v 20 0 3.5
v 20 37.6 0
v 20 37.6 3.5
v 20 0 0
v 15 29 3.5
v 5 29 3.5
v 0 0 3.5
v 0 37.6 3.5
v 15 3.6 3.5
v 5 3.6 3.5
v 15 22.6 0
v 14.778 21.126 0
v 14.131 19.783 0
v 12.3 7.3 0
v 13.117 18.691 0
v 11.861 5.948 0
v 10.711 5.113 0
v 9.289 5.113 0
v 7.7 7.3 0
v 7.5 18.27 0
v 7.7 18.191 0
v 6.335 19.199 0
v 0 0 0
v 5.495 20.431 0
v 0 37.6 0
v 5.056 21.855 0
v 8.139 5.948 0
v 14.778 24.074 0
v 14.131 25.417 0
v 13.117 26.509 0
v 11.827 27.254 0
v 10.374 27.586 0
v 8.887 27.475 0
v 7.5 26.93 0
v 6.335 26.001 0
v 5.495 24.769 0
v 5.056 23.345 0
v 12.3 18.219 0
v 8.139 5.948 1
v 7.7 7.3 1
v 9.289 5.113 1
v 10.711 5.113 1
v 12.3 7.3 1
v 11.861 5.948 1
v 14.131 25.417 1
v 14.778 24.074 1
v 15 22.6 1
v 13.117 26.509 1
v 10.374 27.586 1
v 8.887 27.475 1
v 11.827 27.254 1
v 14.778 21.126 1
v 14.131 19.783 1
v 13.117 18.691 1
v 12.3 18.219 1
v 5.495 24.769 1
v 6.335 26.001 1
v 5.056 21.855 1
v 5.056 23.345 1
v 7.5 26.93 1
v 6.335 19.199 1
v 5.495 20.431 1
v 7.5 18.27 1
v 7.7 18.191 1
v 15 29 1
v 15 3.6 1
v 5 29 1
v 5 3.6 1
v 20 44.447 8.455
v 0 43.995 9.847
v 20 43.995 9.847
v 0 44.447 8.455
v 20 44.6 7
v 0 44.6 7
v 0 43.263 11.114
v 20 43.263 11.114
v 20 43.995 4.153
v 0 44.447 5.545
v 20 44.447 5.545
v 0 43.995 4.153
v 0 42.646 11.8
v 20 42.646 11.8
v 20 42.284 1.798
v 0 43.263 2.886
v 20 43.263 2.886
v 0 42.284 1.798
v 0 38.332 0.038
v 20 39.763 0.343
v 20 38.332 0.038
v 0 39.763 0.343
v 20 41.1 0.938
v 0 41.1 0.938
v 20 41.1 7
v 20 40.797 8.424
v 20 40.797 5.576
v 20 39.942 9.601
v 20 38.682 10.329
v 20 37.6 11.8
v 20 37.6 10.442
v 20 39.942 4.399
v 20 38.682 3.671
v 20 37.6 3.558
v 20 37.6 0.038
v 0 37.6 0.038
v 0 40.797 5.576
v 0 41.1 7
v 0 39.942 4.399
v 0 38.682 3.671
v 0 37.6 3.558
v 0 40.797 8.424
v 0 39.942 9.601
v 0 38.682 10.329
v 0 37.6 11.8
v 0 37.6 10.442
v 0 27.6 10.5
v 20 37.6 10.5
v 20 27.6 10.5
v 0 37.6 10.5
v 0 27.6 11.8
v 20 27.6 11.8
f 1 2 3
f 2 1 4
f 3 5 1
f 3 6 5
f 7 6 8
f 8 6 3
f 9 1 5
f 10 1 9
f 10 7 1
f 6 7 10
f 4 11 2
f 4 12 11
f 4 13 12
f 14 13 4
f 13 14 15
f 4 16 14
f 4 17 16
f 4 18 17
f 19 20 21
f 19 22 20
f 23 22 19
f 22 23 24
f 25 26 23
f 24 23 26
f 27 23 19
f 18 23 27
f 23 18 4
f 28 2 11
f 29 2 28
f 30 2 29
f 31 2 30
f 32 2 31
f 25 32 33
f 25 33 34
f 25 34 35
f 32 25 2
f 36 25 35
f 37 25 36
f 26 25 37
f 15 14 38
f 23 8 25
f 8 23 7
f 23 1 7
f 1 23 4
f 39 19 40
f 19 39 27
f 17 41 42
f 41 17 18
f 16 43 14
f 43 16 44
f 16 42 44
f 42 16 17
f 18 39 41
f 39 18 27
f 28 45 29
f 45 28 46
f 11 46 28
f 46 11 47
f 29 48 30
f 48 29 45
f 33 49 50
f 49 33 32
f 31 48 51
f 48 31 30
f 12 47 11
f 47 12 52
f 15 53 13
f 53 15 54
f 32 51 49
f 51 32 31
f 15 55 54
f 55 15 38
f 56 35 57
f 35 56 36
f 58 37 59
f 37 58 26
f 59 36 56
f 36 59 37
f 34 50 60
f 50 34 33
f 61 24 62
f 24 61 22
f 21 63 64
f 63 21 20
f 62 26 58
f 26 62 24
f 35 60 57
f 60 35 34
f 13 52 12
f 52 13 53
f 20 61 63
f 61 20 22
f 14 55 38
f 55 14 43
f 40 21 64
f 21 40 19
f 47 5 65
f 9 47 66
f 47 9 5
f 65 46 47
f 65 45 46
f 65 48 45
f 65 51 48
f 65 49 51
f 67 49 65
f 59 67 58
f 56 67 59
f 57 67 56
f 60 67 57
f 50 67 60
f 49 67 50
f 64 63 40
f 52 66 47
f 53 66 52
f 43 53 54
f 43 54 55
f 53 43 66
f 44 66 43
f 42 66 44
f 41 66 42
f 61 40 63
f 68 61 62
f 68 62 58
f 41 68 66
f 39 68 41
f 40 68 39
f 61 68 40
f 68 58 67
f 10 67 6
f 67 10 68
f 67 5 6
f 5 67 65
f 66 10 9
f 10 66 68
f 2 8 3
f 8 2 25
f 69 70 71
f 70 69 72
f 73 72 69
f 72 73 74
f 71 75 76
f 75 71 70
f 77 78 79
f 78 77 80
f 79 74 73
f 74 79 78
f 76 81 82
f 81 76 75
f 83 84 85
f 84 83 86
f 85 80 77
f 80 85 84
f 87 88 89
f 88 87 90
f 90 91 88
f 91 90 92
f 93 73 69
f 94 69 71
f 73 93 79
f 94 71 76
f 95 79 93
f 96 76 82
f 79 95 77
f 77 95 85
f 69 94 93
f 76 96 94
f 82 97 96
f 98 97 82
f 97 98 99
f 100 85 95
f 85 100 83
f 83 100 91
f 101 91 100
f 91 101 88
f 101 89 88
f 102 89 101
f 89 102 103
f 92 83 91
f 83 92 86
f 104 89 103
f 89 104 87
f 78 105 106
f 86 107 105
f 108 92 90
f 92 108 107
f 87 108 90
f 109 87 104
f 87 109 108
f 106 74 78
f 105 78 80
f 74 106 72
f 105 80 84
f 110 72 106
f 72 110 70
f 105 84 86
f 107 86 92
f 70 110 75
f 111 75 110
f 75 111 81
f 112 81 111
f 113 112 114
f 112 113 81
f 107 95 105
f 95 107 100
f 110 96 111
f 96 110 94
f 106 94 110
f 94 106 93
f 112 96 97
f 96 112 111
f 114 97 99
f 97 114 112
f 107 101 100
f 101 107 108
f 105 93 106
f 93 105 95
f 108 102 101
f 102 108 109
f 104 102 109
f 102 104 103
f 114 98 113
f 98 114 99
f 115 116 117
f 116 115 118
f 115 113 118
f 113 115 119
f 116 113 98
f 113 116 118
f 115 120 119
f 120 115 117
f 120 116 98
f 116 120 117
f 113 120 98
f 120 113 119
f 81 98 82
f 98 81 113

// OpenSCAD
//all measurements in mm

// quality settings
fs=1.5; // cylinder circumferential length of each side

// lock portion shaped like:
//
// +----->
// |     x
// v y
//   ___
//  /   \
// |     | lock_open_radius
//  \   /
//   | |
//   | | lock_height
//   | |
//   \_/ lock_radius
lock_offset_y    = 5;
lock_radius      = 2.3;
lock_height      = 8;
lock_open_radius = 5;
// thickness of lock portion
lock_depth       = 3.5;
// thickness of portion that has to close inside lapdock
lock_depth_inner = 1.3;
// padding to allow for the screw head fitting between lock and LCD
screw_head_depth = 2.5;
screw_head_rad   = 3.7;
lock_pad_x       = 5;
lock_pad_y       = 5;
// thickness of the lapdock LCD
screen_depth     = 7;
clip_height      = 10;

plate_w = 2*lock_open_radius+2*lock_pad_x;
plate_l = 2*lock_open_radius+lock_height+2*lock_radius+2*lock_pad_y;

module lock_plate()
{
    screw_head_overhang = screw_head_rad-lock_radius;
    difference() {
        cube([plate_w, plate_l, lock_depth]);
        translate([plate_w/2,lock_pad_y+lock_radius,-1])
            cylinder($fs=fs, h=lock_depth+2, r=lock_radius);
        translate([plate_w/2,plate_l-lock_pad_y-lock_open_radius,-1]) 
            cylinder($fs=fs, h=lock_depth+2, r=lock_open_radius);
        translate([plate_w/2-lock_radius,lock_pad_y+lock_radius,-1])
            cube([2*lock_radius, lock_height+lock_radius+lock_open_radius, lock_depth+2]);
        translate([lock_pad_x, lock_pad_y-screw_head_overhang, lock_depth-screw_head_depth])
            cube([lock_open_radius*2, lock_height+2*lock_radius+2*lock_open_radius+2*screw_head_overhang, screw_head_depth+1]);
    }
    translate([0, plate_l, 0]) cube([plate_w, lock_offset_y, lock_depth]);
}

module clip()
{
    outer_rad = screen_depth/2+lock_depth;
    inner_rad = screen_depth/2;
    difference() {
        union() {
            translate([0,plate_l+lock_offset_y,outer_rad]) difference() {
                rotate([90, 0, 90]) difference() {
                    cylinder($fs=fs, h=plate_w, r=screen_depth/2+lock_depth);
                    translate([0,0,-1]) cylinder($fs=fs, h=plate_w+2, r=inner_rad);
                }
                translate([-1,-outer_rad,-outer_rad]) cube([plate_w+2, outer_rad, outer_rad*2]);
            }
            translate([0, plate_l+lock_offset_y, 2*outer_rad])
            rotate([180, 0, 0])
                cube([plate_w, clip_height, lock_depth]);
        }
        // cut off the top portion of the clip so the lapdock can close
        translate([-1, plate_l+lock_pad_y-clip_height-1, outer_rad+inner_rad+lock_depth_inner]) cube([plate_w+2, outer_rad+clip_height+2, lock_depth]);
    }
}

module vesa_clip()
{
	union() {
		lock_plate();
        clip();
	}
}

vesa_clip();
